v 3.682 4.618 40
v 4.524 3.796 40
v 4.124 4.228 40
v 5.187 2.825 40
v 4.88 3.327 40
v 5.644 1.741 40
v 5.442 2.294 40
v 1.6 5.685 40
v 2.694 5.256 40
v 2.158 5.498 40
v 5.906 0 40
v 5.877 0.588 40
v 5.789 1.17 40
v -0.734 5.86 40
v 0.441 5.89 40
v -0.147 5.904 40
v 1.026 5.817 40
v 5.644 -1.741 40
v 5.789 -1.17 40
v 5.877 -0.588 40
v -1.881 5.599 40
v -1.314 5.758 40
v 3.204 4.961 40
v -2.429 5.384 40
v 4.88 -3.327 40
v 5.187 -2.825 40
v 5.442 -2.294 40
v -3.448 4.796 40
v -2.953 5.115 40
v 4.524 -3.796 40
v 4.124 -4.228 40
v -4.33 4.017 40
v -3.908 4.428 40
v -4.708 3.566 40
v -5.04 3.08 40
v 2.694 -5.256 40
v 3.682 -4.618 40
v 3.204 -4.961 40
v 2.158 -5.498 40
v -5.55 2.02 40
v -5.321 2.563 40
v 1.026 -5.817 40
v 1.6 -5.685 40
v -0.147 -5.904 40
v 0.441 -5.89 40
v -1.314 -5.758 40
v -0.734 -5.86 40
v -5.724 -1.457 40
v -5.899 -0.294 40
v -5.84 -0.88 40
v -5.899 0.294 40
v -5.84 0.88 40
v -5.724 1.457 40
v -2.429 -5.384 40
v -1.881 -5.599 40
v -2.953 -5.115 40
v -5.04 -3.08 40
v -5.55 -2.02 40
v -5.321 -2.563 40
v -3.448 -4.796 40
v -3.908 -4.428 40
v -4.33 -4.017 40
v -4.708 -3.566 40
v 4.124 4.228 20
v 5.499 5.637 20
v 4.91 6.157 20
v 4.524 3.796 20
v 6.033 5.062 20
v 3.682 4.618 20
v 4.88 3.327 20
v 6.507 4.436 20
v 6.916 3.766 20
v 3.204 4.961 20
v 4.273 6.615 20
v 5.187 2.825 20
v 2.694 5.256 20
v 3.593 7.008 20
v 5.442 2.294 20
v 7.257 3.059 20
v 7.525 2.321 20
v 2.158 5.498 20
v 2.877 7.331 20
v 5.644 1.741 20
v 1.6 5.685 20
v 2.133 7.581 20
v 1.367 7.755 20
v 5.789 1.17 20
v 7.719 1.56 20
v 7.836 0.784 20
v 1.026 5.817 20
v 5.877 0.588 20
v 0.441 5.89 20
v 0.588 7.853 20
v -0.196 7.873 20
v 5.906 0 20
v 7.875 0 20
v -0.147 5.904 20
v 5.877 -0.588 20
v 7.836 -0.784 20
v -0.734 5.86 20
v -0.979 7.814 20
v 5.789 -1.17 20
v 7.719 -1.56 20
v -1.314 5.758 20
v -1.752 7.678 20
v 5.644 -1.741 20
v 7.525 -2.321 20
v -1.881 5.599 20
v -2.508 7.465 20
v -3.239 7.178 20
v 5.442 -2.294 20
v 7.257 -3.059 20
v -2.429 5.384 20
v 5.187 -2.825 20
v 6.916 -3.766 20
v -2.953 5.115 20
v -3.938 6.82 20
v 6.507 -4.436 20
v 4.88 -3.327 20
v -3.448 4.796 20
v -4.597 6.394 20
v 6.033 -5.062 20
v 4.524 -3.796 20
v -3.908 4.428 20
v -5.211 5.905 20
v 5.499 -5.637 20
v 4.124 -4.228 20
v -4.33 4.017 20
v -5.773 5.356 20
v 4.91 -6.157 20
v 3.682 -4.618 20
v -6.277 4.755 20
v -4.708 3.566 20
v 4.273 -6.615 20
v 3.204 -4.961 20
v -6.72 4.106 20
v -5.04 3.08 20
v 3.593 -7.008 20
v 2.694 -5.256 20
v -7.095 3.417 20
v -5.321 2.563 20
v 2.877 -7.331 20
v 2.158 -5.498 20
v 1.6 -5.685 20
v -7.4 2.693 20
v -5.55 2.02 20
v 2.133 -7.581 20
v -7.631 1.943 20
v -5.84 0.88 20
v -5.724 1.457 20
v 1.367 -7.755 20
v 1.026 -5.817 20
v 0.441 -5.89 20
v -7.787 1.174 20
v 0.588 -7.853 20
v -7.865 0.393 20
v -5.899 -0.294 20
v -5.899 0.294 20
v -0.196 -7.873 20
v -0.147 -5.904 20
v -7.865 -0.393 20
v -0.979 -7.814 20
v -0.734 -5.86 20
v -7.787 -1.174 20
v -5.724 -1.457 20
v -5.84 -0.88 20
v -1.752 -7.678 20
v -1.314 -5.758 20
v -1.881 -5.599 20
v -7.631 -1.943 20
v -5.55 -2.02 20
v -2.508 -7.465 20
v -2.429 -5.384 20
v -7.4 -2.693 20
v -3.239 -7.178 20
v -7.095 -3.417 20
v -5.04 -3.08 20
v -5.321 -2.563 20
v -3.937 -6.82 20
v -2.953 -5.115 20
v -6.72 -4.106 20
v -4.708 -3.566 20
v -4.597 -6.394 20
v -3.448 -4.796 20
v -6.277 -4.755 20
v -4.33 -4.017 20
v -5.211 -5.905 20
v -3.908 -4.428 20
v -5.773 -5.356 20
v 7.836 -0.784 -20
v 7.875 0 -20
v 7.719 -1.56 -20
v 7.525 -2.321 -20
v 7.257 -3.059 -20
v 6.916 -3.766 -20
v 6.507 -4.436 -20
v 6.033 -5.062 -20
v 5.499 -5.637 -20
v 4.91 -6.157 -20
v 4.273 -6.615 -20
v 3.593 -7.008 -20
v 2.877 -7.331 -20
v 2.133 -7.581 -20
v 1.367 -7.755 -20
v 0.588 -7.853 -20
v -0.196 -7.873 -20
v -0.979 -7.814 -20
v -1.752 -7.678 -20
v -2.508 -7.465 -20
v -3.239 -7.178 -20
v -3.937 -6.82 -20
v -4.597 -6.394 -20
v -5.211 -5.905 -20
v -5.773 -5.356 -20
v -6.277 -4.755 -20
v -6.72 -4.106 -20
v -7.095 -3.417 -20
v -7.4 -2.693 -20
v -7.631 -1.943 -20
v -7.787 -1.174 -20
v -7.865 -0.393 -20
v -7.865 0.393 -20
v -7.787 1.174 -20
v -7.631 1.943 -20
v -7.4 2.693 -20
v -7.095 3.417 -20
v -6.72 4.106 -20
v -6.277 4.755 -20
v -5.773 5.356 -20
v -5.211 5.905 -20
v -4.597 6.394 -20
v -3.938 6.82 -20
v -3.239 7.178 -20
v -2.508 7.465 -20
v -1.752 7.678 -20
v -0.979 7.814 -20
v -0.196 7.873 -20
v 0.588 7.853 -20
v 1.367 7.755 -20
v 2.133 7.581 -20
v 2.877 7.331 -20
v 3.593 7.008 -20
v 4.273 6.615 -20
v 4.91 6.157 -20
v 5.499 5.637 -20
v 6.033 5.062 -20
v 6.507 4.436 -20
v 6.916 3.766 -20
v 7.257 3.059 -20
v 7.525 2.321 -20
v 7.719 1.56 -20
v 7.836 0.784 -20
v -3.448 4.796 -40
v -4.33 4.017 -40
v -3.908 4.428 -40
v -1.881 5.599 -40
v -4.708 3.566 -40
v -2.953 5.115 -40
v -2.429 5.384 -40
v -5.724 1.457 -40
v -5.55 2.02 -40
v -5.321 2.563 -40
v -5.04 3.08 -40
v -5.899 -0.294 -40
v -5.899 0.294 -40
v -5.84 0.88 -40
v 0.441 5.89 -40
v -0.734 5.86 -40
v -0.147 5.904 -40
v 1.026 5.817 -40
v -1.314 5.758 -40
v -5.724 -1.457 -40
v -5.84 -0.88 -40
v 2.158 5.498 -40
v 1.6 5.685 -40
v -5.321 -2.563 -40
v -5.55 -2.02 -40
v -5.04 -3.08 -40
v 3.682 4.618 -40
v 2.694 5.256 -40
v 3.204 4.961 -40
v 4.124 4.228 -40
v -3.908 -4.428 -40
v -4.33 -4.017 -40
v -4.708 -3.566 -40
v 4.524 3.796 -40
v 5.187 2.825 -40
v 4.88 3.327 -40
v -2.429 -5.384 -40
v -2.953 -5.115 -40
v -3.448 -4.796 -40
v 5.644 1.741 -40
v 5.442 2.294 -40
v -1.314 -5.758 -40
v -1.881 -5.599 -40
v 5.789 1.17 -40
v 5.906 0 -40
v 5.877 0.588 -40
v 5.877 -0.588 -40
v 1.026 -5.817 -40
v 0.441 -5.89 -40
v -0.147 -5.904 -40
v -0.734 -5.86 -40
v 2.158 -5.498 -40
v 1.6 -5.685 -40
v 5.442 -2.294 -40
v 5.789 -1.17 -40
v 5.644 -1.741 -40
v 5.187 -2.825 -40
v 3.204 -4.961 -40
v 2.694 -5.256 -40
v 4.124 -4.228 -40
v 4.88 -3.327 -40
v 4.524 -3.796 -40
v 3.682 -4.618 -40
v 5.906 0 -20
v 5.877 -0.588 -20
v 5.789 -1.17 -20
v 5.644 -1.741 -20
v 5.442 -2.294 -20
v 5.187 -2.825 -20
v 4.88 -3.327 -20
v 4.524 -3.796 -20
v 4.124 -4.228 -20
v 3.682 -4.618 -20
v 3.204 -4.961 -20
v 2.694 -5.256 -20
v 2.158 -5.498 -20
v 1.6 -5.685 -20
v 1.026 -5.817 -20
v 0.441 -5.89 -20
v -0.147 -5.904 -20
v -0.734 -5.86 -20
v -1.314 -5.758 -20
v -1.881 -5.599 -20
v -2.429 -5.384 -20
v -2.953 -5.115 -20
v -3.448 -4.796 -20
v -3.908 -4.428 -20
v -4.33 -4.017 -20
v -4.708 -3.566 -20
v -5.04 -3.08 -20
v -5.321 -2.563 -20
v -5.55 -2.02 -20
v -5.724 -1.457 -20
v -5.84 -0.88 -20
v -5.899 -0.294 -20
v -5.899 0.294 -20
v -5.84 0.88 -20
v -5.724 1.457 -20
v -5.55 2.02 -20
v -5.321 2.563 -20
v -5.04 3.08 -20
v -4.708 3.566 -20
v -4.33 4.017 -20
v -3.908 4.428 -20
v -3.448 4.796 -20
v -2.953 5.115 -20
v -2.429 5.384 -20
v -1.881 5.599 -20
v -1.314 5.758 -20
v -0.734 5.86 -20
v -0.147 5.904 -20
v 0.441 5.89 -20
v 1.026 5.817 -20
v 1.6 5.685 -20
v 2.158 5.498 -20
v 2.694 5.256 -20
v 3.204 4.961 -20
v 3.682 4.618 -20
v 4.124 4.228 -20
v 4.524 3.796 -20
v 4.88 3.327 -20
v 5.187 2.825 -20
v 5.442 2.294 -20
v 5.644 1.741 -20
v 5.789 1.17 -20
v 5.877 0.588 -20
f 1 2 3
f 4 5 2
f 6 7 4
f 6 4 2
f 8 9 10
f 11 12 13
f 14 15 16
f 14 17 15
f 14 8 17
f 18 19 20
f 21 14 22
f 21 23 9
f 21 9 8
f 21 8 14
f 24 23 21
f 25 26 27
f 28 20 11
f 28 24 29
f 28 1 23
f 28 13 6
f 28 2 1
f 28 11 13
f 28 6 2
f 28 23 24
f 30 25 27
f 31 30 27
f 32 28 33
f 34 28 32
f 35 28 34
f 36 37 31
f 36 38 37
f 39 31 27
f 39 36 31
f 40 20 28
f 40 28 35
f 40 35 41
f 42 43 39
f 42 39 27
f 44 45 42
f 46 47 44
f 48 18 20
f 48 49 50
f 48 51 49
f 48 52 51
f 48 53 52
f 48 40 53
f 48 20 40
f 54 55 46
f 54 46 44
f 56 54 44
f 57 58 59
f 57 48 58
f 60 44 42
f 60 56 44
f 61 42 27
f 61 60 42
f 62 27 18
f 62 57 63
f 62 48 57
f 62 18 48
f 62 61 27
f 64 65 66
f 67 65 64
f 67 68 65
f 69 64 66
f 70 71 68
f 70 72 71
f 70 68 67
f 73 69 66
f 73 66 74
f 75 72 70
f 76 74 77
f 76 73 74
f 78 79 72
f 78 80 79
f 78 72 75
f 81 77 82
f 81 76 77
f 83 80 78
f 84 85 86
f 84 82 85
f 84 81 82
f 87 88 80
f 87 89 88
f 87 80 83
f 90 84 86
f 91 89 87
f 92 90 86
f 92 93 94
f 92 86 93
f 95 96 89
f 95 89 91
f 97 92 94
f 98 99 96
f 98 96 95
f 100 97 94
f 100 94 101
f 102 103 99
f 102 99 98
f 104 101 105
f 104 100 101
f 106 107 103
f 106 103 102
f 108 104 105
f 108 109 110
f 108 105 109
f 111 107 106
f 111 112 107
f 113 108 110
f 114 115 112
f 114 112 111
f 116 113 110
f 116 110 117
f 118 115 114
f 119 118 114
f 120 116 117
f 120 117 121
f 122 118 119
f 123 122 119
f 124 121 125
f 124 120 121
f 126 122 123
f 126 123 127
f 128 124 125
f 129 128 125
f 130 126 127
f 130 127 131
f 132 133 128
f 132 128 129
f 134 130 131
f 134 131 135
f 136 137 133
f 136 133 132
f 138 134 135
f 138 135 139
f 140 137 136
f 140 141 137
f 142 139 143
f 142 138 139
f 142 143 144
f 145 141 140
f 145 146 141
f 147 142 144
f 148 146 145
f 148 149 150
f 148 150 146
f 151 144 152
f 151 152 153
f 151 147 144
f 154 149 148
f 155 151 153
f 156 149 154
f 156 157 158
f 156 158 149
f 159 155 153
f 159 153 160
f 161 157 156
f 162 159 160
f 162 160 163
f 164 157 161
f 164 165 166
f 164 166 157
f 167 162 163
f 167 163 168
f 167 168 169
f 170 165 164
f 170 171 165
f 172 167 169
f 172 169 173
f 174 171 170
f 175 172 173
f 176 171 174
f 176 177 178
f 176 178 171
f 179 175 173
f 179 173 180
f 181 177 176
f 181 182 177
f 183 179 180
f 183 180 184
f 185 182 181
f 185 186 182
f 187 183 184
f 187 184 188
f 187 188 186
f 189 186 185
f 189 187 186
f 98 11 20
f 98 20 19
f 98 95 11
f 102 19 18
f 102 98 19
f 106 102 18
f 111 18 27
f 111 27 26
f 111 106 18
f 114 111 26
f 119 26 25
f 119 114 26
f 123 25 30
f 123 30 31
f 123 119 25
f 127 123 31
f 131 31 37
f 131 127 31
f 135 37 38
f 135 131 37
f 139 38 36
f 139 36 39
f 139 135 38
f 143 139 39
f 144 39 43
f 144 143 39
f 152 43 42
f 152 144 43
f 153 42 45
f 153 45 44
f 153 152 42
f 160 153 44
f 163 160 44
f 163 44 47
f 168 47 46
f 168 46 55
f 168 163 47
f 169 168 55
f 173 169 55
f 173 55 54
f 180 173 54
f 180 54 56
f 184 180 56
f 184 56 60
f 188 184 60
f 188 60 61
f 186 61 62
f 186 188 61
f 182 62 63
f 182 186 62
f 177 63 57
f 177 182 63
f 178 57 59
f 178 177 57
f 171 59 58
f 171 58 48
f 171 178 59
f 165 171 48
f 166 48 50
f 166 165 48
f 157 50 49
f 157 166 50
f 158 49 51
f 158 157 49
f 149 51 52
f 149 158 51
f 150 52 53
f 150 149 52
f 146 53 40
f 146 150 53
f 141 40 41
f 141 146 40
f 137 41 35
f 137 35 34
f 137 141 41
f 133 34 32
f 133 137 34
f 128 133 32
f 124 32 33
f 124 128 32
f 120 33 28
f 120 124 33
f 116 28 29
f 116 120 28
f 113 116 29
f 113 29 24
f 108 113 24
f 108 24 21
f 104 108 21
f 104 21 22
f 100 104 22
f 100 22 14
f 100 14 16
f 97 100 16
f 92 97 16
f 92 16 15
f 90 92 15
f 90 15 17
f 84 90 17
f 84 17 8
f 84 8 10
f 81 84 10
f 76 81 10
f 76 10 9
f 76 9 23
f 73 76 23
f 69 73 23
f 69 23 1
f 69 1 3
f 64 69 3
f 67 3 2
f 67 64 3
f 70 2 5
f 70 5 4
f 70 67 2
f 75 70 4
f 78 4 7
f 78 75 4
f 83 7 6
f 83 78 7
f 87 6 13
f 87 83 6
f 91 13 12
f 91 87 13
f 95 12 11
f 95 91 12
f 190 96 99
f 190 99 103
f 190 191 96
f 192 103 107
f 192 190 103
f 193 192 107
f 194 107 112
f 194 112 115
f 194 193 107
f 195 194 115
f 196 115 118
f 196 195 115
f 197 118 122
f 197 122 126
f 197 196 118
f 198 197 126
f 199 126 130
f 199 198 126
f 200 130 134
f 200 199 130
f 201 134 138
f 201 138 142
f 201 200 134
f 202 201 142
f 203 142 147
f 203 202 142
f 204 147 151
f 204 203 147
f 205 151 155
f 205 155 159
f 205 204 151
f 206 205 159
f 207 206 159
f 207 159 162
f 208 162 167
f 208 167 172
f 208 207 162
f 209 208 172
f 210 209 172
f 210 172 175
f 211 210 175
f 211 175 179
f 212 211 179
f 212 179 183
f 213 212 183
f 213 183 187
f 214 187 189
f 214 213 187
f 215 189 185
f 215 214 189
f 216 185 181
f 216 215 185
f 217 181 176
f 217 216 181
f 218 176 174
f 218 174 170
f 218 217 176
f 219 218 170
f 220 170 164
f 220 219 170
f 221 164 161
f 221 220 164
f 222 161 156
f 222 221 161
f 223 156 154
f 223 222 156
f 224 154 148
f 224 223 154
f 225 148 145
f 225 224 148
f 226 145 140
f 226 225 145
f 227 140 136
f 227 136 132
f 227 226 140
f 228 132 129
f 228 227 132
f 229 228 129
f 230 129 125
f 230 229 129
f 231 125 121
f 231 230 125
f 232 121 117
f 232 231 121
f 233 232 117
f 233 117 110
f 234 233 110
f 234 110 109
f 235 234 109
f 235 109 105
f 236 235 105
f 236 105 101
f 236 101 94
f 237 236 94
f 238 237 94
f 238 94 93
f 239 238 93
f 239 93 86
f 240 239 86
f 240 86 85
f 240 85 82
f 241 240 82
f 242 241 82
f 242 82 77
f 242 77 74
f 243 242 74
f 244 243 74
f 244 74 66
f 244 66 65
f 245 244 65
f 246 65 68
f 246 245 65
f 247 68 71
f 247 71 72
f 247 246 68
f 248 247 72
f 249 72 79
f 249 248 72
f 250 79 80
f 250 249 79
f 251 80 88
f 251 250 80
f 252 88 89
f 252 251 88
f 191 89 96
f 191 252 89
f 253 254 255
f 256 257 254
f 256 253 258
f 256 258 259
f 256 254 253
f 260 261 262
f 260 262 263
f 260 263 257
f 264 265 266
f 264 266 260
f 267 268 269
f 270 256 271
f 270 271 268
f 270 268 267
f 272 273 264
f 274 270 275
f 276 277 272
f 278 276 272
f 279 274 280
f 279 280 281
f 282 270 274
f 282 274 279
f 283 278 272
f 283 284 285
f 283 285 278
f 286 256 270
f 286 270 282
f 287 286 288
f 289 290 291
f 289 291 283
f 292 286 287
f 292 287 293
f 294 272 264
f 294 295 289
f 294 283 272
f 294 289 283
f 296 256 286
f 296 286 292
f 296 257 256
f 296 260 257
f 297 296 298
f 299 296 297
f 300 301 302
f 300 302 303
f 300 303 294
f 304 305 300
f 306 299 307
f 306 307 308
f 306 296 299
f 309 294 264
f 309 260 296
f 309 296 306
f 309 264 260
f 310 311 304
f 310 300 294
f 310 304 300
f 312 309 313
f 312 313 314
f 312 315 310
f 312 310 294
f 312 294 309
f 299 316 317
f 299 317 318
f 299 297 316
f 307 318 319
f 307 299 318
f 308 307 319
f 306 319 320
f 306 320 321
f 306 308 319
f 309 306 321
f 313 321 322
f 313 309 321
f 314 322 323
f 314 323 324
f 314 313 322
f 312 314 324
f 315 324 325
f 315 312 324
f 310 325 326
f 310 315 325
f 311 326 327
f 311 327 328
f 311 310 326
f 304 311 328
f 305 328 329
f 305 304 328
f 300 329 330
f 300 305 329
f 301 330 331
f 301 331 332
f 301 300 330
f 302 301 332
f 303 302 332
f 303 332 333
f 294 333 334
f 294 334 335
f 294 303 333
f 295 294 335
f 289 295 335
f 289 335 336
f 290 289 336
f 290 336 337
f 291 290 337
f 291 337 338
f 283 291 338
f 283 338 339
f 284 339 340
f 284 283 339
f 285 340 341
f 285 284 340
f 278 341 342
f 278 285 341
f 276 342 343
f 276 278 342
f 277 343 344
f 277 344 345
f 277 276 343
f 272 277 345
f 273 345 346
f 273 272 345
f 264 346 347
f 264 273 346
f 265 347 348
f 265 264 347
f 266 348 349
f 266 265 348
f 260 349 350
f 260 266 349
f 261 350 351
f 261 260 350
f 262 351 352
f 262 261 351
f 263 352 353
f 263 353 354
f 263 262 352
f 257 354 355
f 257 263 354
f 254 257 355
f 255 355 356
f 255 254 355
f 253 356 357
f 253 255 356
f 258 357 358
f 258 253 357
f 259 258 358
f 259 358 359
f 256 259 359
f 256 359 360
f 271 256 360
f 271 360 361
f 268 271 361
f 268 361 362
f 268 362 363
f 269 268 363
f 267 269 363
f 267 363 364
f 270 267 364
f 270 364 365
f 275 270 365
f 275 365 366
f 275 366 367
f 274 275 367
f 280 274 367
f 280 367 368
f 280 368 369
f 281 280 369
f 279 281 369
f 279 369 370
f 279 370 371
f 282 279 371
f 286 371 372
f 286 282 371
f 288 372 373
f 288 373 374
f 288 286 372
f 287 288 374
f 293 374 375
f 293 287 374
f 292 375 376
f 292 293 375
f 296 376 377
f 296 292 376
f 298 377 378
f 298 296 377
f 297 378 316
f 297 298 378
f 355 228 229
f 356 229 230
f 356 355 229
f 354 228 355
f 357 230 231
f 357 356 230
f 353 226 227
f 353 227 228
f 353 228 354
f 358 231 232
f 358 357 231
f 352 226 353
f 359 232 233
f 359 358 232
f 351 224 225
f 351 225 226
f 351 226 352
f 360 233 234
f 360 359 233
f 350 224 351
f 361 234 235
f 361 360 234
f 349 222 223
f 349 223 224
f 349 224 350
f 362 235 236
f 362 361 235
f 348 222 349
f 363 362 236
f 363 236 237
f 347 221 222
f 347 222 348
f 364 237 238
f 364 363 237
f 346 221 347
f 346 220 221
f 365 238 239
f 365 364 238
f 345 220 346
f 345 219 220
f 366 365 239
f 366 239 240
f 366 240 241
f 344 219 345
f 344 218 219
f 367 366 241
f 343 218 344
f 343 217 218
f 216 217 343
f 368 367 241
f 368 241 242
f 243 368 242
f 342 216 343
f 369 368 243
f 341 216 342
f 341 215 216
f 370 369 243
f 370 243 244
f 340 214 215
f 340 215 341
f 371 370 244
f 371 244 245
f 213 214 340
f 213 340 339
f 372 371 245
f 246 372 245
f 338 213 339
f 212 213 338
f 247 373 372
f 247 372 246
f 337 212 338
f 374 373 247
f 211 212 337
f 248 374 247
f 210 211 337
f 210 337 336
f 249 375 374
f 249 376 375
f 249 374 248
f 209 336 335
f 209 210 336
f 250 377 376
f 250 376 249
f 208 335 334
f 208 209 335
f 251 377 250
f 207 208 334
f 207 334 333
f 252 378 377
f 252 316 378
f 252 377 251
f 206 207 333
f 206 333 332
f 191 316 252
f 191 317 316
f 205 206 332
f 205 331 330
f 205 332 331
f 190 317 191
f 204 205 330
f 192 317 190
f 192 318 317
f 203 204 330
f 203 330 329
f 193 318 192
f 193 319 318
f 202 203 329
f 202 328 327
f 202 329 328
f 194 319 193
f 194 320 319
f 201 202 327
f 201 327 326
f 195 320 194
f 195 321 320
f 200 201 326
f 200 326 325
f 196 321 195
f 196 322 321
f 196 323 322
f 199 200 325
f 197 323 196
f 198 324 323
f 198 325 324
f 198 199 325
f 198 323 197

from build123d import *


with BuildPart() as part:
    # Sketch1 → Base-Revolve (revolve)
    with BuildSketch(Plane(origin=(0, 0, 0), x_dir=(0, 0, -1), z_dir=(1, 0, 0))):
        Polygon((-40, 0), (-40, 5.90625), (-20, 5.90625), (-20, 7.875), (20, 7.875), (20, 5.90625), (40, 5.90625), (40, 0), align=None)
    revolve(axis=Axis((0, 0, 61.5315), (0, 0, -1)))


solid = part.part
